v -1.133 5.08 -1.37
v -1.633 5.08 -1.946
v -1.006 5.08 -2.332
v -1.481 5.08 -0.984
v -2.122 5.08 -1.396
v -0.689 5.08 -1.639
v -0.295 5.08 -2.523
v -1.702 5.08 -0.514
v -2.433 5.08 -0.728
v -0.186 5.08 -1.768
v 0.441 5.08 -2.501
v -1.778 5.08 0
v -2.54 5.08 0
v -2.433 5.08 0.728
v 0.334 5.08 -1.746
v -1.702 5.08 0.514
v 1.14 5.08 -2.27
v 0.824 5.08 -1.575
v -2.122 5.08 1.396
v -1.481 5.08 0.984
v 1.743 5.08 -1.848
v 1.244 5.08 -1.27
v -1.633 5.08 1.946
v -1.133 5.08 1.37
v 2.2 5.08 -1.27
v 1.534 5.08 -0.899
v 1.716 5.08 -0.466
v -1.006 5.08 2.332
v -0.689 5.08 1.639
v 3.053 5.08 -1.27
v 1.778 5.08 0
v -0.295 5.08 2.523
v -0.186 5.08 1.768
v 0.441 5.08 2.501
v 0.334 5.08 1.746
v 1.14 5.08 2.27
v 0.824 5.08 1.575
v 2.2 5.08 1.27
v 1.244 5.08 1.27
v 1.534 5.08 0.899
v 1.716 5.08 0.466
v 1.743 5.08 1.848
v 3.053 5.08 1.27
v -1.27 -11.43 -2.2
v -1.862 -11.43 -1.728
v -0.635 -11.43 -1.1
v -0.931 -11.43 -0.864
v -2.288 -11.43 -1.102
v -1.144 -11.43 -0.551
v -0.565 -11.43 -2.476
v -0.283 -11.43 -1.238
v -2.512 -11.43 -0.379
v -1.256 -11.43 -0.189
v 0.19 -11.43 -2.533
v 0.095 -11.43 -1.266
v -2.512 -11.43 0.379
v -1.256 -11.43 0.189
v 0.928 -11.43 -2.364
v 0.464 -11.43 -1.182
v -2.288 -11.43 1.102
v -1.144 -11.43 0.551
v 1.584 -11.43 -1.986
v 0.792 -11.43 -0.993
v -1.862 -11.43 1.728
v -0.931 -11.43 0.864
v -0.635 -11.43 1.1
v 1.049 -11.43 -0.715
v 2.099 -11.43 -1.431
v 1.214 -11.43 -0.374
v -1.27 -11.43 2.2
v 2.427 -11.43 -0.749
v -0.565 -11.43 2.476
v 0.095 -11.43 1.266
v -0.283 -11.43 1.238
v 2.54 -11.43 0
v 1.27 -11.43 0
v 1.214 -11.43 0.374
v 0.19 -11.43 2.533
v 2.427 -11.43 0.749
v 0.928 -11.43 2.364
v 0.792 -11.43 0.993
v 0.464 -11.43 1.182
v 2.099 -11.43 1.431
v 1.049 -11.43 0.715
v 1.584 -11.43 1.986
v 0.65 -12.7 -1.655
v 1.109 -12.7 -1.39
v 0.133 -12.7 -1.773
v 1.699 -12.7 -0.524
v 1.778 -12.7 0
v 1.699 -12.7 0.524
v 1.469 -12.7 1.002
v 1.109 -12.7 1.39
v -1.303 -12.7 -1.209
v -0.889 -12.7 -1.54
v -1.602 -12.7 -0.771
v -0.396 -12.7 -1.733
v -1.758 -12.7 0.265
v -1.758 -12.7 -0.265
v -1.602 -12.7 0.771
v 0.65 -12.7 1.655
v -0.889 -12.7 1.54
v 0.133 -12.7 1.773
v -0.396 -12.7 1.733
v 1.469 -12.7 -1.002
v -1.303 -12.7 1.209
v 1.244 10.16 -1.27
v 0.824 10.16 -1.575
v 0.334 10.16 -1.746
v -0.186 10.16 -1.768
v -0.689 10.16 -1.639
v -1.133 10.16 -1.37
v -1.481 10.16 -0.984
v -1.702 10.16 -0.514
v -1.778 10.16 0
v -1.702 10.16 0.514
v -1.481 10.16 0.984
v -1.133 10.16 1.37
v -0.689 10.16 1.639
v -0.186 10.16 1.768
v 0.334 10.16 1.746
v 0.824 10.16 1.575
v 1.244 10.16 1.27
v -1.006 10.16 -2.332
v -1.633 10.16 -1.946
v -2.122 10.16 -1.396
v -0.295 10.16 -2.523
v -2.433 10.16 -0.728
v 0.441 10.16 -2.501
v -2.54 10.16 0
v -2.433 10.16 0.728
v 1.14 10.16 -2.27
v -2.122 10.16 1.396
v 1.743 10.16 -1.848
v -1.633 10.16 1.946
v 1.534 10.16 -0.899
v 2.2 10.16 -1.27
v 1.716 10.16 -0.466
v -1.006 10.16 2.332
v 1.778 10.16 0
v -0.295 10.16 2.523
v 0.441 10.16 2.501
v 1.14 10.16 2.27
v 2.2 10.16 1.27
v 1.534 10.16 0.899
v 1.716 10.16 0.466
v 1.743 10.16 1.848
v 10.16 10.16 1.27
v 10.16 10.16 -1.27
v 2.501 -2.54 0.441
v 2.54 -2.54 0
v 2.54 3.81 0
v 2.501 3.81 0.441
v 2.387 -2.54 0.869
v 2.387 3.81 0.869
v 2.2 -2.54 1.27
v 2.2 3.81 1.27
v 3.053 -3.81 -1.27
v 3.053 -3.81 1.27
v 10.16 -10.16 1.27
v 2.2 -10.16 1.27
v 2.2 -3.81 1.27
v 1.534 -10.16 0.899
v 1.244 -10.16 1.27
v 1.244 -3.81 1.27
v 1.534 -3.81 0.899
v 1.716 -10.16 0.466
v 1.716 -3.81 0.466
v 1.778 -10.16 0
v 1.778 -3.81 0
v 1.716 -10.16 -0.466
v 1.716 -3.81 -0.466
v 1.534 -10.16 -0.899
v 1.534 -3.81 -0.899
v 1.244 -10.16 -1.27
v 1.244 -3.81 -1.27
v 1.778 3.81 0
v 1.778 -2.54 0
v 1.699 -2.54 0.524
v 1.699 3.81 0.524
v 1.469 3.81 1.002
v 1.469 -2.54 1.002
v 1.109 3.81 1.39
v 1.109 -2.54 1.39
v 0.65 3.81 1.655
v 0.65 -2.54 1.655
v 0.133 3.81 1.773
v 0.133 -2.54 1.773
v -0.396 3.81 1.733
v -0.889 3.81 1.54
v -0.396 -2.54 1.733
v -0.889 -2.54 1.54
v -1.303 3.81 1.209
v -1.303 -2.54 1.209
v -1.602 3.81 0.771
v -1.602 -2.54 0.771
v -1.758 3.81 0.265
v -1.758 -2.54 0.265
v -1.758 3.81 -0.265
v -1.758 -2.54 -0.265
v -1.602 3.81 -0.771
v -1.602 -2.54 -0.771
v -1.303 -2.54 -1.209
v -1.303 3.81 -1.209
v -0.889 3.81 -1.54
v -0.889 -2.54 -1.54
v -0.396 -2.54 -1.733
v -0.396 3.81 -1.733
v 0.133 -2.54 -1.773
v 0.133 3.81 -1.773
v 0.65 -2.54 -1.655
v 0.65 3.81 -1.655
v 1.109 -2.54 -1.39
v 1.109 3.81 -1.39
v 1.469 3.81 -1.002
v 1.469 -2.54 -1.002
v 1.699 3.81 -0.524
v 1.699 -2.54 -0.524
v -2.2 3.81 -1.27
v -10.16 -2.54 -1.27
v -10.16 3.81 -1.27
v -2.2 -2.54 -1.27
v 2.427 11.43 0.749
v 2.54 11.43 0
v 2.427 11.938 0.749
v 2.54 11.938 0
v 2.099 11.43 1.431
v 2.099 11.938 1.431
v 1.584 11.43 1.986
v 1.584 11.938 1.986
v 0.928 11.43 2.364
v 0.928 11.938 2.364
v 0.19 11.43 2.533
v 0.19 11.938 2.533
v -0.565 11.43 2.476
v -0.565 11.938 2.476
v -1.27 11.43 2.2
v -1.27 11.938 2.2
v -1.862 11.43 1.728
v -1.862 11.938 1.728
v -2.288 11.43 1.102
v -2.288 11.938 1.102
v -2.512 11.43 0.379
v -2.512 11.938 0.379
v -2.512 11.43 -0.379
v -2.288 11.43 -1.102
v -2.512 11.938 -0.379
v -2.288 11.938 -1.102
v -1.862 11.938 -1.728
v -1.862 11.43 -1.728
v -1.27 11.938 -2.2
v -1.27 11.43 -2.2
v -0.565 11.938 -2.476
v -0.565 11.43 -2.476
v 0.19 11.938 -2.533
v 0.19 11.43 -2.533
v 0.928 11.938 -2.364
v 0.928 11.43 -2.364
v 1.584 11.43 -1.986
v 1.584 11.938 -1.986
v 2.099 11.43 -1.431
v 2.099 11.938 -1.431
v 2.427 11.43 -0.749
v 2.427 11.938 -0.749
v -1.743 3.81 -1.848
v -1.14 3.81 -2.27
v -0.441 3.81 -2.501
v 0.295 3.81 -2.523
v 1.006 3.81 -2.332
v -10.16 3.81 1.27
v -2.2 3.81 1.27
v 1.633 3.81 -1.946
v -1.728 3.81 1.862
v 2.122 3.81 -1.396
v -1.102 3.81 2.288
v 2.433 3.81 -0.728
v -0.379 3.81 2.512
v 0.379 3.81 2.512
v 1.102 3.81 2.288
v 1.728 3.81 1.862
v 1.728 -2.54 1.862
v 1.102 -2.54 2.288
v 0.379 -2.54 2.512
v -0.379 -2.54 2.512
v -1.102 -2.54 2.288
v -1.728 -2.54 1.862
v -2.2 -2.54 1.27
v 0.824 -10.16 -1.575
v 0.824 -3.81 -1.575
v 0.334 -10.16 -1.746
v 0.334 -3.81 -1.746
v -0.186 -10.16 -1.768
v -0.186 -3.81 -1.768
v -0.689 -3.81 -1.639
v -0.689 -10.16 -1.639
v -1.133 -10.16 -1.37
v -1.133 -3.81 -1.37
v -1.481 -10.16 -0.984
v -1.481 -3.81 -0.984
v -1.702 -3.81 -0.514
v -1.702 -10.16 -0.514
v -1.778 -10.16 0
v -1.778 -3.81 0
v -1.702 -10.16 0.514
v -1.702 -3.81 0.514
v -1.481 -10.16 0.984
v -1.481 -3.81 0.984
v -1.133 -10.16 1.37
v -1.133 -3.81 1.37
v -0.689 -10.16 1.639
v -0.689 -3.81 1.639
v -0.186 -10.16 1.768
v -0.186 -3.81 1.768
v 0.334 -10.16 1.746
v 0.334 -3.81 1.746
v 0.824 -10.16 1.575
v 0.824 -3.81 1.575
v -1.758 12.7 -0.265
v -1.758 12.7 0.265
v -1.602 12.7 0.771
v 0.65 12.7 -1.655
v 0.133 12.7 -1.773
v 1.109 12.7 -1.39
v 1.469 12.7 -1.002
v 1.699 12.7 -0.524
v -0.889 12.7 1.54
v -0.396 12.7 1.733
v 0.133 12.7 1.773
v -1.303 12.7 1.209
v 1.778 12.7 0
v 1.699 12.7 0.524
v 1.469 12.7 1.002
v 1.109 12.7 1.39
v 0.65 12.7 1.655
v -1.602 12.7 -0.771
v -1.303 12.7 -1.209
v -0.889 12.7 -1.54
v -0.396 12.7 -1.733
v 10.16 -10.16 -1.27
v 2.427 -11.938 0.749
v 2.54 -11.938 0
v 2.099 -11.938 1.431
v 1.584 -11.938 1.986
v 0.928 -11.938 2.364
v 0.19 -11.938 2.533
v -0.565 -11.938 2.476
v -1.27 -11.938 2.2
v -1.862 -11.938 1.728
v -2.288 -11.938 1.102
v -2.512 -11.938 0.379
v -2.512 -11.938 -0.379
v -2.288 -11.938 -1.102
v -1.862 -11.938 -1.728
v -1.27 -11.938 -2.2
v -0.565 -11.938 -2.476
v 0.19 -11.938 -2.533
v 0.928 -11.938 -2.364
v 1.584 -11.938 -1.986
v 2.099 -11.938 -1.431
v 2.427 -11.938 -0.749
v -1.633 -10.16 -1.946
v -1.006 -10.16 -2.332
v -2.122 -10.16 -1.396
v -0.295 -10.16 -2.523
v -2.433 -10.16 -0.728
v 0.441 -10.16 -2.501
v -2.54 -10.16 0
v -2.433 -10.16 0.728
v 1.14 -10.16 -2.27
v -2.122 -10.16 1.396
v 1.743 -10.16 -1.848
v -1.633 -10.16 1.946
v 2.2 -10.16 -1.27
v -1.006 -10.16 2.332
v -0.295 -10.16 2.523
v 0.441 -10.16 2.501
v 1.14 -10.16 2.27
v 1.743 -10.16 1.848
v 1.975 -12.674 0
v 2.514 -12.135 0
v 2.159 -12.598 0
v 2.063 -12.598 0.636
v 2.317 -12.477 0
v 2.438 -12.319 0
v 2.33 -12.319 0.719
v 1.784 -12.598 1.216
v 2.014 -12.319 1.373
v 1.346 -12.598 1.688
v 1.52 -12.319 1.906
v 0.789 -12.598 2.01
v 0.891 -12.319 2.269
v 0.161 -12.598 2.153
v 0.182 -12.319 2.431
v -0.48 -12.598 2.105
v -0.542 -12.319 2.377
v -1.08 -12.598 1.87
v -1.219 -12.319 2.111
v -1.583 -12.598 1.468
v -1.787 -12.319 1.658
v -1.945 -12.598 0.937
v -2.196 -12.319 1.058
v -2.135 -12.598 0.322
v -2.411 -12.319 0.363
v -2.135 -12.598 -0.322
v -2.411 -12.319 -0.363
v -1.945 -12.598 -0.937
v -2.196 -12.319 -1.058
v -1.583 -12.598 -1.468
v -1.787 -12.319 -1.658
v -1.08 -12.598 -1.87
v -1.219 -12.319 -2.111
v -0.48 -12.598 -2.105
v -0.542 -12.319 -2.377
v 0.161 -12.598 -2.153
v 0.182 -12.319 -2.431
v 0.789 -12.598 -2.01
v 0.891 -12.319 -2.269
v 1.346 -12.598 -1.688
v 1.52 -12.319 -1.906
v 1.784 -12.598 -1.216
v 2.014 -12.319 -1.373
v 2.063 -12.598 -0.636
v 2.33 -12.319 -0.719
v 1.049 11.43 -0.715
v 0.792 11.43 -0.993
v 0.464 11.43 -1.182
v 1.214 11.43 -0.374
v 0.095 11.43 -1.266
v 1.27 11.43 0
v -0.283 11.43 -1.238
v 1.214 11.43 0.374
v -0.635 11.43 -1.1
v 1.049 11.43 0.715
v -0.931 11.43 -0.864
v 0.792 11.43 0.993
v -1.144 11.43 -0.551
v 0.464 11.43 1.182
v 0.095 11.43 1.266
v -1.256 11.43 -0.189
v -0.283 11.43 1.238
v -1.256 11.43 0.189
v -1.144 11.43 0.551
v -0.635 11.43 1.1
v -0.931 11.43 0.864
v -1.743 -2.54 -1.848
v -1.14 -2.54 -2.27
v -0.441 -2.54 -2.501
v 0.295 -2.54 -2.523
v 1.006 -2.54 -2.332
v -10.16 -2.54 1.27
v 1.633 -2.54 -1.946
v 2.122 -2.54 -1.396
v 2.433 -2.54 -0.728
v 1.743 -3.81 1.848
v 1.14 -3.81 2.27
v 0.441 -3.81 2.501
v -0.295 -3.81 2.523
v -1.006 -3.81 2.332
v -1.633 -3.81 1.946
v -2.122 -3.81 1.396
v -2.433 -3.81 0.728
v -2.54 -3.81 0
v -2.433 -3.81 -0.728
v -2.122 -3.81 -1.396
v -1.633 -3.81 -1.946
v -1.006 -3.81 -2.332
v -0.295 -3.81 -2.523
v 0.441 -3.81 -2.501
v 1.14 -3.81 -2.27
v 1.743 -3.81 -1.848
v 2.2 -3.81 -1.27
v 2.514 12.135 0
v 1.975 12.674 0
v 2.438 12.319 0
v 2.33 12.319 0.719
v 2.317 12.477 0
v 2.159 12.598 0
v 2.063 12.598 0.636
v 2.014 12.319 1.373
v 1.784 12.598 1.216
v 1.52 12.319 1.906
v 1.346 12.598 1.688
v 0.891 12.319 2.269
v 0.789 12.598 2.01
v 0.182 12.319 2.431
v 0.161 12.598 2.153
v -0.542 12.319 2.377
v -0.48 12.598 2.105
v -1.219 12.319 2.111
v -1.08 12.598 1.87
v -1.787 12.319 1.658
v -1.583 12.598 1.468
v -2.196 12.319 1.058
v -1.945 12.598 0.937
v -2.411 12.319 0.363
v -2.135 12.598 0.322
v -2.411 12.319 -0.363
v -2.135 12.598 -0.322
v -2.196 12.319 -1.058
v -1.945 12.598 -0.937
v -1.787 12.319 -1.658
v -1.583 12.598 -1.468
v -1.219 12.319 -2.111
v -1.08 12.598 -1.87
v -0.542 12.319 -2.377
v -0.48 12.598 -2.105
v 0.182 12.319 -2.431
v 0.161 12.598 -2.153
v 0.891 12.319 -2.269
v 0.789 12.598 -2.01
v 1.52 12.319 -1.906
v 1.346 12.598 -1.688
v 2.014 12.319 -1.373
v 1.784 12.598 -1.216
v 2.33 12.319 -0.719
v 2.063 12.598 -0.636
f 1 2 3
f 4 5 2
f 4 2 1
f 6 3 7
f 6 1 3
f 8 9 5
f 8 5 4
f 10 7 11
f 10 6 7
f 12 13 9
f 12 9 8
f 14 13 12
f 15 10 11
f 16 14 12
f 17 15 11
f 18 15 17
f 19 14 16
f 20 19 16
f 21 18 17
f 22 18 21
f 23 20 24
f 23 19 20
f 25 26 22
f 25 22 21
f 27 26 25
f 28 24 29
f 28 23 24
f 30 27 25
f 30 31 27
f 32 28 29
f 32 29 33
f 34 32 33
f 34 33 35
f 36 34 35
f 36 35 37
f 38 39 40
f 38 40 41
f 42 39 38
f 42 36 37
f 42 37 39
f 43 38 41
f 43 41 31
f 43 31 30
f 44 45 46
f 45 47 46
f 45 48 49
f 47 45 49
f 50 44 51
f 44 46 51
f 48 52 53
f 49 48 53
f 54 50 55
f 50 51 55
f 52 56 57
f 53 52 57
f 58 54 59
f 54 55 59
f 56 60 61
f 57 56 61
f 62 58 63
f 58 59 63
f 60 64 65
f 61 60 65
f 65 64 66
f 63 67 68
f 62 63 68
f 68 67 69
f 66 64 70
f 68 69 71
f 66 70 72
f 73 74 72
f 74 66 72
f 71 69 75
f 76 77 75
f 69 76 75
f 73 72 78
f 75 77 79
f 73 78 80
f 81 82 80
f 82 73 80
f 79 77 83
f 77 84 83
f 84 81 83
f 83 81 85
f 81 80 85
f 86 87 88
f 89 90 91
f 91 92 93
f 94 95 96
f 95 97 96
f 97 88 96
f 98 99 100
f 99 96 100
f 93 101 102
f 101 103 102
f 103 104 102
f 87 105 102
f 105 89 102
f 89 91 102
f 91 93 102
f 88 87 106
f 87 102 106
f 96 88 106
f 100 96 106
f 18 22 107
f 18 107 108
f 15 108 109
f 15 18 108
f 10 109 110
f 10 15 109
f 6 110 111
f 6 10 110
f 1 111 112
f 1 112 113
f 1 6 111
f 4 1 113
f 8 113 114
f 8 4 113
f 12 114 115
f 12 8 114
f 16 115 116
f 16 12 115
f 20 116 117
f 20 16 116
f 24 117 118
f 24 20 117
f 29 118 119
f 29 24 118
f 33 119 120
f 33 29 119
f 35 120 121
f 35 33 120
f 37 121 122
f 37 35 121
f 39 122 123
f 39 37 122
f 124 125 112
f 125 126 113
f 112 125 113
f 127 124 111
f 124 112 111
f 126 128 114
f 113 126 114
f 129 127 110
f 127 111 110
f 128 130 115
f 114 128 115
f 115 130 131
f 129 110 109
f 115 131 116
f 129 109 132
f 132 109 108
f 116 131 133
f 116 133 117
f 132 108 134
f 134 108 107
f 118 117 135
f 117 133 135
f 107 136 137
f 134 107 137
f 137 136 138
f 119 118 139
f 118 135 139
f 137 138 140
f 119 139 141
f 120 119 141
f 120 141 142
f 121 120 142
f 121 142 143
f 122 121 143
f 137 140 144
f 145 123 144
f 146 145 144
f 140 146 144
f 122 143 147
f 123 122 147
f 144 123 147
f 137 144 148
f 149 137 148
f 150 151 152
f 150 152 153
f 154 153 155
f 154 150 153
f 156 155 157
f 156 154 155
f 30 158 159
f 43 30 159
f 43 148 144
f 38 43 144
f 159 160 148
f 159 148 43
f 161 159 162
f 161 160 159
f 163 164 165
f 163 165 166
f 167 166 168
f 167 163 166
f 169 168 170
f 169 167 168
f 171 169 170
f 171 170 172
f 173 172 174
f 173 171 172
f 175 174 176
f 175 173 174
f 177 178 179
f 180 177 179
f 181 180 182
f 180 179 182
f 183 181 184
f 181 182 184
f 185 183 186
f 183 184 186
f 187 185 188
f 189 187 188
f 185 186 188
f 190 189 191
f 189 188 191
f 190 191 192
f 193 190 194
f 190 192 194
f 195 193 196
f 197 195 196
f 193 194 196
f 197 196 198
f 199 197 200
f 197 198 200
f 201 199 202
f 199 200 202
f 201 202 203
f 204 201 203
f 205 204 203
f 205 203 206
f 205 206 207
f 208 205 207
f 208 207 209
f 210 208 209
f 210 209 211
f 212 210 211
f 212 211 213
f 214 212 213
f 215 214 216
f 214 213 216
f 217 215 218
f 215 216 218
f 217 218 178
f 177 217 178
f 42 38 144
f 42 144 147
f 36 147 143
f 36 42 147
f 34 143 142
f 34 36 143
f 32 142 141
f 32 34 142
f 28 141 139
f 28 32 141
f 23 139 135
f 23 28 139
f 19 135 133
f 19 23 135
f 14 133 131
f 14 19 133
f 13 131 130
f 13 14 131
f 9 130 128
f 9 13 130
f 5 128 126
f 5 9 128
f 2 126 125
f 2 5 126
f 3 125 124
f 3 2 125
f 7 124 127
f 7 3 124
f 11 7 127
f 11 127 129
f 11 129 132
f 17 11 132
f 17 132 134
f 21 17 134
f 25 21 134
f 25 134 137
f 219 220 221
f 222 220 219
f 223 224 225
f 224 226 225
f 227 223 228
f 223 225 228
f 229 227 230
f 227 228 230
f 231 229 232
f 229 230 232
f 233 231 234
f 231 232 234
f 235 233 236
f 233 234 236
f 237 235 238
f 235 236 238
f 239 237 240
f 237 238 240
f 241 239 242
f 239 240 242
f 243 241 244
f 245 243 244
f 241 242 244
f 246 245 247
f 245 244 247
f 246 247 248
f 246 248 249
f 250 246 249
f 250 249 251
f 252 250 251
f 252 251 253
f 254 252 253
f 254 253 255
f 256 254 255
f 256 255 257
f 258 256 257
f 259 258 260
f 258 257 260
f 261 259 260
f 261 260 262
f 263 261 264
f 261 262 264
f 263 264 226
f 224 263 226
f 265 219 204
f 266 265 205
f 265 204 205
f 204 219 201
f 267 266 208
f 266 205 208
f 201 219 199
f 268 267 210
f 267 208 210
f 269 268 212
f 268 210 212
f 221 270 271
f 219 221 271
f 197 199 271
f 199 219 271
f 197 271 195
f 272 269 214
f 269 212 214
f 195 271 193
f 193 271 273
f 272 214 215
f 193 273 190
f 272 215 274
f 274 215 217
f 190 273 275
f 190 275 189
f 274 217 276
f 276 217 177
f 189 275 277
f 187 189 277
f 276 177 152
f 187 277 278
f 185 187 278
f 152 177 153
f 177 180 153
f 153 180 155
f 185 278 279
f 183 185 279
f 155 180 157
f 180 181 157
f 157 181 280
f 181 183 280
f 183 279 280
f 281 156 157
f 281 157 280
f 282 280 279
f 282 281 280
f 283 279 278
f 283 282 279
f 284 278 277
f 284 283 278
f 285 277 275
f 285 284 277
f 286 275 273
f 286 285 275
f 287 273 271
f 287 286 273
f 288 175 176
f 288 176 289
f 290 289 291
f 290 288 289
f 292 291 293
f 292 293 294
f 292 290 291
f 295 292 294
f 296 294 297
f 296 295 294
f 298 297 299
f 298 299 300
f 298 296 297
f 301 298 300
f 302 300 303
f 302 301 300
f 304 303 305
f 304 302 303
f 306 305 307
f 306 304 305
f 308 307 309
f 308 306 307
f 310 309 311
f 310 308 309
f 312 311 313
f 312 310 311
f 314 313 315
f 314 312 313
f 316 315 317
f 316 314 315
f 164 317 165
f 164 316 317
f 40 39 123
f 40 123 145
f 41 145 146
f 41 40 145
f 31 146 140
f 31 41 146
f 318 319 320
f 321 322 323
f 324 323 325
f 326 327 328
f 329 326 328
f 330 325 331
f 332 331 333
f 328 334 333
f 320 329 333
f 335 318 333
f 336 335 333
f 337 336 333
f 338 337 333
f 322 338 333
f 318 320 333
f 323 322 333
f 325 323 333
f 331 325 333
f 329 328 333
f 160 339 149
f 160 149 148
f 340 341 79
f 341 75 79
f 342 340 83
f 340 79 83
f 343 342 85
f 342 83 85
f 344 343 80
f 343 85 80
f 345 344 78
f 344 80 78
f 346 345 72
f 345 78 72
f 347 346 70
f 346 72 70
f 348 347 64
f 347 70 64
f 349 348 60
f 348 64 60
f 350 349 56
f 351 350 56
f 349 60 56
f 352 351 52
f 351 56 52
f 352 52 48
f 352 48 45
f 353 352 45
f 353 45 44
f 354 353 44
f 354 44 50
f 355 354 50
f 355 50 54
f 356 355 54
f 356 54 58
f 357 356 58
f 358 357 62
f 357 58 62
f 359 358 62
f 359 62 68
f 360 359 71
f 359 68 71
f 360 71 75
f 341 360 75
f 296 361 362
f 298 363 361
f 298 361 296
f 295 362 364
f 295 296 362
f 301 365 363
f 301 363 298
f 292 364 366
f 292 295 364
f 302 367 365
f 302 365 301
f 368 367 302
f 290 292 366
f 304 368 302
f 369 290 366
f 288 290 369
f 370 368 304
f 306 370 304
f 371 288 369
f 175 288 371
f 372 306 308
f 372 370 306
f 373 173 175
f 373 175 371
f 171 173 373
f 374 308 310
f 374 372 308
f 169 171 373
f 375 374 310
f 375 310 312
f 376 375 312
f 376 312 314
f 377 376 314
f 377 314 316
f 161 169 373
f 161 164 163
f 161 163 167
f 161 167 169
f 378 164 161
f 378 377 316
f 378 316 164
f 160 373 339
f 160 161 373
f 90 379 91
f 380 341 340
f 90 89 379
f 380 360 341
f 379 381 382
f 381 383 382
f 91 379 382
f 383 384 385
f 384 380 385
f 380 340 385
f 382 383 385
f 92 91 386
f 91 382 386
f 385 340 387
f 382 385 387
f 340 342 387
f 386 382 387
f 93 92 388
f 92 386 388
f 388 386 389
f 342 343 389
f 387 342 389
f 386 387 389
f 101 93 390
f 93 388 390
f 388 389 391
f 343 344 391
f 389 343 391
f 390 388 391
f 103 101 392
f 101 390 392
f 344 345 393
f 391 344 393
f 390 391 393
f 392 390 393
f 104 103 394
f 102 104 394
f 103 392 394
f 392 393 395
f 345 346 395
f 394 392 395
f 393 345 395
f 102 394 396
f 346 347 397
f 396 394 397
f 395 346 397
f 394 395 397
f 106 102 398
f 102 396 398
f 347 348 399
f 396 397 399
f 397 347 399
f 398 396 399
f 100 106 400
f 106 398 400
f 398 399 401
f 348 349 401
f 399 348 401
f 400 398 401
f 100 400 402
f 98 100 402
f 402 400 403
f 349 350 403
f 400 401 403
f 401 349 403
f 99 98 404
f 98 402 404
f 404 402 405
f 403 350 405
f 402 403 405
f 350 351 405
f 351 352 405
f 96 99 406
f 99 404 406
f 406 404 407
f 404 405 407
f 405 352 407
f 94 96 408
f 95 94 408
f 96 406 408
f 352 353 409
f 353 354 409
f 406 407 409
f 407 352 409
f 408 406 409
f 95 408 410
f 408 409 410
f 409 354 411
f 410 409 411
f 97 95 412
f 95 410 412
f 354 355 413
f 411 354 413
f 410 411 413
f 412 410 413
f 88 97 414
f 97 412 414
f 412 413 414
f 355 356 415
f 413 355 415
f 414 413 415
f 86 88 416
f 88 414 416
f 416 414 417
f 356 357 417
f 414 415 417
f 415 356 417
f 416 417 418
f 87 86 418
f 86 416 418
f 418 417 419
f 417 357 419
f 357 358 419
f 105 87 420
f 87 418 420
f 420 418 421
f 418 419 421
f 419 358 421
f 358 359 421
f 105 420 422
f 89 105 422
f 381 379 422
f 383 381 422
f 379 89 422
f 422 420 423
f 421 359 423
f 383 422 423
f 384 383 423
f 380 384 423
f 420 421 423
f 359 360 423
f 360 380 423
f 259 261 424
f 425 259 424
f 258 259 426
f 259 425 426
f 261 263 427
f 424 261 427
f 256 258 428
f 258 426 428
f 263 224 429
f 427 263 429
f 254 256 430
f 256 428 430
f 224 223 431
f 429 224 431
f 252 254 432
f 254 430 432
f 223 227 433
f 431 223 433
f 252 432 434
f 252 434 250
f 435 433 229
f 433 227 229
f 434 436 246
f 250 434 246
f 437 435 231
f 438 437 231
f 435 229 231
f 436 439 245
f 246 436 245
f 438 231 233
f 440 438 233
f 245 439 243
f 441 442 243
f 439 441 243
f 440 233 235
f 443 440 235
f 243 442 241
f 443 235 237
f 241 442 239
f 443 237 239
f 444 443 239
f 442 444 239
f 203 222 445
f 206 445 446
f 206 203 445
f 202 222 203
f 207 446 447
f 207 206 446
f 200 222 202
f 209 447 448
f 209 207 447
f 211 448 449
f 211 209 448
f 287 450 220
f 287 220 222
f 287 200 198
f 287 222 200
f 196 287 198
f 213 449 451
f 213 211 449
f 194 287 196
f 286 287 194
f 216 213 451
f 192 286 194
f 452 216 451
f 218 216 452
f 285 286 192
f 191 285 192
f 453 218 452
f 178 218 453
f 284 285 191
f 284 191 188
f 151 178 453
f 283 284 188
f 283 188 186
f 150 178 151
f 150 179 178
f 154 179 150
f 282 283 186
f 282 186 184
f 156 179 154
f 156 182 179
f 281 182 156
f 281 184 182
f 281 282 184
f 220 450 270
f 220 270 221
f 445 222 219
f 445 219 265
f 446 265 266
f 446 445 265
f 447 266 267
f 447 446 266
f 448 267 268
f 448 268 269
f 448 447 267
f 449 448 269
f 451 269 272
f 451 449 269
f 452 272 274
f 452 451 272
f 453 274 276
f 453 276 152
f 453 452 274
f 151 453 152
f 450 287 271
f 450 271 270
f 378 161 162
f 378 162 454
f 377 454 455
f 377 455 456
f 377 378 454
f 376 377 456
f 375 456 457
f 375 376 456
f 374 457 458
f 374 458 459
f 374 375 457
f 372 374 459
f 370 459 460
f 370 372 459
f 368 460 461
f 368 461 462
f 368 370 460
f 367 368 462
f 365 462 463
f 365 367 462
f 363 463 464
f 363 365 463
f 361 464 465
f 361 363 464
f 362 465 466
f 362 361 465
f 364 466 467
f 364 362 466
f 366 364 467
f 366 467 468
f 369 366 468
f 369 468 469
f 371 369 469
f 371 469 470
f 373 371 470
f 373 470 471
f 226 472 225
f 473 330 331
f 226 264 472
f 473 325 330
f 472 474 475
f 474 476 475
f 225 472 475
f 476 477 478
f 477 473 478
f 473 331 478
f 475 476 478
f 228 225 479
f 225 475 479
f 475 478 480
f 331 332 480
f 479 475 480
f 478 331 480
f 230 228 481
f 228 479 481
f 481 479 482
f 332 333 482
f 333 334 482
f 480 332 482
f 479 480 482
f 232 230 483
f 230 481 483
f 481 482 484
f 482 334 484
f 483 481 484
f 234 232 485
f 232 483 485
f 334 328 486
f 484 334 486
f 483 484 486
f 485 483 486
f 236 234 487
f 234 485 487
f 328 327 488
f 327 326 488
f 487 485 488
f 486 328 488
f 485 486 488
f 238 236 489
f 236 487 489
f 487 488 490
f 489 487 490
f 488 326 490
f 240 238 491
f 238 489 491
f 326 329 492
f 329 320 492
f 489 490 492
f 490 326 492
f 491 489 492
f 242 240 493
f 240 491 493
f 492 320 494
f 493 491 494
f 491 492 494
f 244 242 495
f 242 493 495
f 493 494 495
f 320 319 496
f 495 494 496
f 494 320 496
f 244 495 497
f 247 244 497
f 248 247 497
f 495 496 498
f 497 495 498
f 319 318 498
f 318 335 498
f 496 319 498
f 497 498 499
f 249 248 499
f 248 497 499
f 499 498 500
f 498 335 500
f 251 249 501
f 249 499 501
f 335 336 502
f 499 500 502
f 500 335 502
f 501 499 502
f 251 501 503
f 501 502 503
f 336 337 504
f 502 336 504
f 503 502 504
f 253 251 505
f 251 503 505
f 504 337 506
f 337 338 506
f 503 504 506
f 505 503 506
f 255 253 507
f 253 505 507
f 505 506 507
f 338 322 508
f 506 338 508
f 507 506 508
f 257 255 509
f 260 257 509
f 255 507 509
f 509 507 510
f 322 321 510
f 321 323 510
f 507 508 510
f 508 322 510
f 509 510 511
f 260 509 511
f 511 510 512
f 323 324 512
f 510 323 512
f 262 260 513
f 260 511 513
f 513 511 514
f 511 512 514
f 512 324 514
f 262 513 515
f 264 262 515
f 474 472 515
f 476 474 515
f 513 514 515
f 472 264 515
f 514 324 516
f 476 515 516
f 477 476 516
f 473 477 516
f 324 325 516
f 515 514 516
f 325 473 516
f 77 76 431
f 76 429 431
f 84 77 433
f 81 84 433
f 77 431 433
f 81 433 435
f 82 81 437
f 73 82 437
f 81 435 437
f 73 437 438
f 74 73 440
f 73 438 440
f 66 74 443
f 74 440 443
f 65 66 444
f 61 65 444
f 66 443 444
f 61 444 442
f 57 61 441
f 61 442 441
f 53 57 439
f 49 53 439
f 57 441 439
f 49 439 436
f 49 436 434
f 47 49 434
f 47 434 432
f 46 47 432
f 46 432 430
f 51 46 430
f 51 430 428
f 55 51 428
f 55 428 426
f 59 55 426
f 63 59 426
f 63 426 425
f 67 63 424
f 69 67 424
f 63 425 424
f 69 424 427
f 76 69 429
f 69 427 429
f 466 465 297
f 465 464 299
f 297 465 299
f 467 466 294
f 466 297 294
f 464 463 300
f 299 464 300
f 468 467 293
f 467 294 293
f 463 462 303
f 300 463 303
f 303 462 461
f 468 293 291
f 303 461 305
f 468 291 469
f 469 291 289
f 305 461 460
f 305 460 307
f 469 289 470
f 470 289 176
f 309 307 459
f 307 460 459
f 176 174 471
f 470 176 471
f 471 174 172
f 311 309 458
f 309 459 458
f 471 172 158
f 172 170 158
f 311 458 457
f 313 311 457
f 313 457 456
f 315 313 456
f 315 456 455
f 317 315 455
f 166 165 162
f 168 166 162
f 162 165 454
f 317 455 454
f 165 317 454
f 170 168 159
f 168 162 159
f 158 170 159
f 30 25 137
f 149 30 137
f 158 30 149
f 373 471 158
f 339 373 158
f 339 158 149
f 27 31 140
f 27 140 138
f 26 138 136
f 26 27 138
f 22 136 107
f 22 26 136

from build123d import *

# Parameters (mm, degrees)
F0_W      = 1.27
F0_H      = 1.27
F0_H_2    = 22.86
F4_DEPTH  = 6.35
F3_W      = 7.1074573154
F3_H      = 2.54
F5_DEPTH  = 20.32
F8_DEPTH  = 5.08
F10_R     = 1.778
F11_DEPTH = 6.35


with BuildPart() as f1:
    # F0 (on Top) → F1 (revolve)
    with BuildSketch(Plane.XY):
        with Locations((0.635, 12.065)):
            Rectangle(F0_W, F0_H)
        with BuildLine():
            Line((1.778, 12.7), (1.27, 12.7))
            Line((1.27, 12.7), (1.27, 11.43))
            Line((1.27, 11.43), (2.54, 11.43))
            Line((2.54, 11.43), (2.54, 11.938))
            ThreePointArc((2.54, 11.938), (2.3168153673, 12.4768153673), (1.778, 12.7))
        make_face()
        with Locations((0.635, -12.065)):
            Rectangle(F0_W, F0_H)
        with Locations((0.635, 0)):
            Rectangle(F0_W, F0_H_2)
        with BuildLine():
            Line((2.54, -11.43), (1.27, -11.43))
            Line((1.27, -11.43), (1.27, -12.7))
            Line((1.27, -12.7), (1.778, -12.7))
            ThreePointArc((1.778, -12.7), (2.3168153673, -12.4768153673), (2.54, -11.938))
            Line((2.54, -11.938), (2.54, -11.43))
        make_face()
    revolve(axis=Axis((0, 0, 0), (0, -1, 0)))


with BuildPart() as f4:
    # F3 (on offset) → F4 (new body)
    with BuildSketch(Plane.XZ.offset(10.16)):
        with BuildLine():
            ThreePointArc((1.2443407893, 1.27), (1.6391647146, 0.6887837384), (1.778, 0))
            ThreePointArc((1.778, 0), (1.6391647146, -0.6887837384), (1.2443407893, -1.27))
            Line((1.2443407893, -1.27), (2.1997045256, -1.27))
            Line((2.1997045256, -1.27), (2.1997045256, 1.27))
            Line((2.1997045256, 1.27), (1.2443407893, 1.27))
        make_face()
        with BuildLine():
            ThreePointArc((2.54, 0), (2.4534515988, 0.6574003746), (2.1997045256, 1.27))
            Line((2.1997045256, 1.27), (2.1997045256, -1.27))
            ThreePointArc((2.1997045256, -1.27), (2.4534515988, -0.6574003746), (2.54, 0))
        make_face()
        with BuildLine():
            Line((3.0525426846, 1.27), (2.1997045256, 1.27))
            ThreePointArc((2.1997045256, 1.27), (2.4534515988, 0.6574003746), (2.54, 0))
            ThreePointArc((2.54, 0), (2.4534515988, -0.6574003746), (2.1997045256, -1.27))
            Line((2.1997045256, -1.27), (3.0525426846, -1.27))
            Line((3.0525426846, -1.27), (3.0525426846, 1.27))
        make_face()
        with BuildLine():
            ThreePointArc((1.2443407893, -1.27), (-1.778, 0), (1.2443407893, 1.27))
            Line((1.2443407893, 1.27), (2.1997045256, 1.27))
            ThreePointArc((2.1997045256, 1.27), (-2.54, 0), (2.1997045256, -1.27))
            Line((2.1997045256, -1.27), (1.2443407893, -1.27))
        make_face()
    extrude(amount=-F4_DEPTH)

    # F3 (on offset) → F5 (join)
    with BuildSketch(Plane.XZ.offset(10.16)):
        with Locations((6.6062713423, 0)):
            Rectangle(F3_W, F3_H)
    extrude(amount=-F5_DEPTH)

    # F7 (on offset) → F8 (join)
    with BuildSketch(Plane.XZ.offset(-5.08)):
        with BuildLine():
            Line((1.2443407893, 1.27), (2.1997045256, 1.27))
            ThreePointArc((2.1997045256, 1.27), (-2.54, 0), (2.1997045256, -1.27))
            Line((2.1997045256, -1.27), (1.2443407893, -1.27))
            ThreePointArc((1.2443407893, -1.27), (-1.778, 0), (1.2443407893, 1.27))
        make_face()
        with BuildLine():
            ThreePointArc((2.1997045256, -1.27), (2.4534515988, -0.6574003746), (2.54, 0))
            ThreePointArc((2.54, 0), (2.4534515988, 0.6574003746), (2.1997045256, 1.27))
            Line((2.1997045256, 1.27), (1.2443407893, 1.27))
            ThreePointArc((1.2443407893, 1.27), (1.6391647146, 0.6887837384), (1.778, 0))
            ThreePointArc((1.778, 0), (1.6391647146, -0.6887837384), (1.2443407893, -1.27))
            Line((1.2443407893, -1.27), (2.1997045256, -1.27))
        make_face()
        with BuildLine():
            ThreePointArc((2.1997045256, 1.27), (2.4534515988, 0.6574003746), (2.54, 0))
            ThreePointArc((2.54, 0), (2.4534515988, -0.6574003746), (2.1997045256, -1.27))
            Line((2.1997045256, -1.27), (3.0525426846, -1.27))
            Line((3.0525426846, -1.27), (3.0525426846, 1.27))
            Line((3.0525426846, 1.27), (2.1997045256, 1.27))
        make_face()
    extrude(amount=-F8_DEPTH)


with BuildPart() as f11:
    # F10 (on offset) → F11 (new body)
    with BuildSketch(Plane.XZ.offset(2.54)):
        with BuildLine():
            ThreePointArc((-2.1997045256, 1.27), (-2.54, 0), (-2.1997045256, -1.27))
            Line((-2.1997045256, -1.27), (-2.1997045256, 1.27))
        make_face()
        with BuildLine():
            ThreePointArc((-2.1997045256, -1.27), (0.6574003746, -2.4534515988), (2.54, 0))
            ThreePointArc((2.54, 0), (2.4534515988, 0.6574003746), (2.1997045256, 1.27))
            ThreePointArc((2.1997045256, 1.27), (0, 2.54), (-2.1997045256, 1.27))
            Line((-2.1997045256, 1.27), (-2.1997045256, -1.27))
        make_face()
        Circle(F10_R, mode=Mode.SUBTRACT)
        with BuildLine():
            Line((-10.16, -1.27), (-2.1997045256, -1.27))
            ThreePointArc((-2.1997045256, -1.27), (-2.54, 0), (-2.1997045256, 1.27))
            Line((-2.1997045256, 1.27), (-10.16, 1.27))
            Line((-10.16, 1.27), (-10.16, -1.27))
        make_face()
    extrude(amount=-F11_DEPTH)


solid = Compound([f1.part, f4.part, f11.part])
